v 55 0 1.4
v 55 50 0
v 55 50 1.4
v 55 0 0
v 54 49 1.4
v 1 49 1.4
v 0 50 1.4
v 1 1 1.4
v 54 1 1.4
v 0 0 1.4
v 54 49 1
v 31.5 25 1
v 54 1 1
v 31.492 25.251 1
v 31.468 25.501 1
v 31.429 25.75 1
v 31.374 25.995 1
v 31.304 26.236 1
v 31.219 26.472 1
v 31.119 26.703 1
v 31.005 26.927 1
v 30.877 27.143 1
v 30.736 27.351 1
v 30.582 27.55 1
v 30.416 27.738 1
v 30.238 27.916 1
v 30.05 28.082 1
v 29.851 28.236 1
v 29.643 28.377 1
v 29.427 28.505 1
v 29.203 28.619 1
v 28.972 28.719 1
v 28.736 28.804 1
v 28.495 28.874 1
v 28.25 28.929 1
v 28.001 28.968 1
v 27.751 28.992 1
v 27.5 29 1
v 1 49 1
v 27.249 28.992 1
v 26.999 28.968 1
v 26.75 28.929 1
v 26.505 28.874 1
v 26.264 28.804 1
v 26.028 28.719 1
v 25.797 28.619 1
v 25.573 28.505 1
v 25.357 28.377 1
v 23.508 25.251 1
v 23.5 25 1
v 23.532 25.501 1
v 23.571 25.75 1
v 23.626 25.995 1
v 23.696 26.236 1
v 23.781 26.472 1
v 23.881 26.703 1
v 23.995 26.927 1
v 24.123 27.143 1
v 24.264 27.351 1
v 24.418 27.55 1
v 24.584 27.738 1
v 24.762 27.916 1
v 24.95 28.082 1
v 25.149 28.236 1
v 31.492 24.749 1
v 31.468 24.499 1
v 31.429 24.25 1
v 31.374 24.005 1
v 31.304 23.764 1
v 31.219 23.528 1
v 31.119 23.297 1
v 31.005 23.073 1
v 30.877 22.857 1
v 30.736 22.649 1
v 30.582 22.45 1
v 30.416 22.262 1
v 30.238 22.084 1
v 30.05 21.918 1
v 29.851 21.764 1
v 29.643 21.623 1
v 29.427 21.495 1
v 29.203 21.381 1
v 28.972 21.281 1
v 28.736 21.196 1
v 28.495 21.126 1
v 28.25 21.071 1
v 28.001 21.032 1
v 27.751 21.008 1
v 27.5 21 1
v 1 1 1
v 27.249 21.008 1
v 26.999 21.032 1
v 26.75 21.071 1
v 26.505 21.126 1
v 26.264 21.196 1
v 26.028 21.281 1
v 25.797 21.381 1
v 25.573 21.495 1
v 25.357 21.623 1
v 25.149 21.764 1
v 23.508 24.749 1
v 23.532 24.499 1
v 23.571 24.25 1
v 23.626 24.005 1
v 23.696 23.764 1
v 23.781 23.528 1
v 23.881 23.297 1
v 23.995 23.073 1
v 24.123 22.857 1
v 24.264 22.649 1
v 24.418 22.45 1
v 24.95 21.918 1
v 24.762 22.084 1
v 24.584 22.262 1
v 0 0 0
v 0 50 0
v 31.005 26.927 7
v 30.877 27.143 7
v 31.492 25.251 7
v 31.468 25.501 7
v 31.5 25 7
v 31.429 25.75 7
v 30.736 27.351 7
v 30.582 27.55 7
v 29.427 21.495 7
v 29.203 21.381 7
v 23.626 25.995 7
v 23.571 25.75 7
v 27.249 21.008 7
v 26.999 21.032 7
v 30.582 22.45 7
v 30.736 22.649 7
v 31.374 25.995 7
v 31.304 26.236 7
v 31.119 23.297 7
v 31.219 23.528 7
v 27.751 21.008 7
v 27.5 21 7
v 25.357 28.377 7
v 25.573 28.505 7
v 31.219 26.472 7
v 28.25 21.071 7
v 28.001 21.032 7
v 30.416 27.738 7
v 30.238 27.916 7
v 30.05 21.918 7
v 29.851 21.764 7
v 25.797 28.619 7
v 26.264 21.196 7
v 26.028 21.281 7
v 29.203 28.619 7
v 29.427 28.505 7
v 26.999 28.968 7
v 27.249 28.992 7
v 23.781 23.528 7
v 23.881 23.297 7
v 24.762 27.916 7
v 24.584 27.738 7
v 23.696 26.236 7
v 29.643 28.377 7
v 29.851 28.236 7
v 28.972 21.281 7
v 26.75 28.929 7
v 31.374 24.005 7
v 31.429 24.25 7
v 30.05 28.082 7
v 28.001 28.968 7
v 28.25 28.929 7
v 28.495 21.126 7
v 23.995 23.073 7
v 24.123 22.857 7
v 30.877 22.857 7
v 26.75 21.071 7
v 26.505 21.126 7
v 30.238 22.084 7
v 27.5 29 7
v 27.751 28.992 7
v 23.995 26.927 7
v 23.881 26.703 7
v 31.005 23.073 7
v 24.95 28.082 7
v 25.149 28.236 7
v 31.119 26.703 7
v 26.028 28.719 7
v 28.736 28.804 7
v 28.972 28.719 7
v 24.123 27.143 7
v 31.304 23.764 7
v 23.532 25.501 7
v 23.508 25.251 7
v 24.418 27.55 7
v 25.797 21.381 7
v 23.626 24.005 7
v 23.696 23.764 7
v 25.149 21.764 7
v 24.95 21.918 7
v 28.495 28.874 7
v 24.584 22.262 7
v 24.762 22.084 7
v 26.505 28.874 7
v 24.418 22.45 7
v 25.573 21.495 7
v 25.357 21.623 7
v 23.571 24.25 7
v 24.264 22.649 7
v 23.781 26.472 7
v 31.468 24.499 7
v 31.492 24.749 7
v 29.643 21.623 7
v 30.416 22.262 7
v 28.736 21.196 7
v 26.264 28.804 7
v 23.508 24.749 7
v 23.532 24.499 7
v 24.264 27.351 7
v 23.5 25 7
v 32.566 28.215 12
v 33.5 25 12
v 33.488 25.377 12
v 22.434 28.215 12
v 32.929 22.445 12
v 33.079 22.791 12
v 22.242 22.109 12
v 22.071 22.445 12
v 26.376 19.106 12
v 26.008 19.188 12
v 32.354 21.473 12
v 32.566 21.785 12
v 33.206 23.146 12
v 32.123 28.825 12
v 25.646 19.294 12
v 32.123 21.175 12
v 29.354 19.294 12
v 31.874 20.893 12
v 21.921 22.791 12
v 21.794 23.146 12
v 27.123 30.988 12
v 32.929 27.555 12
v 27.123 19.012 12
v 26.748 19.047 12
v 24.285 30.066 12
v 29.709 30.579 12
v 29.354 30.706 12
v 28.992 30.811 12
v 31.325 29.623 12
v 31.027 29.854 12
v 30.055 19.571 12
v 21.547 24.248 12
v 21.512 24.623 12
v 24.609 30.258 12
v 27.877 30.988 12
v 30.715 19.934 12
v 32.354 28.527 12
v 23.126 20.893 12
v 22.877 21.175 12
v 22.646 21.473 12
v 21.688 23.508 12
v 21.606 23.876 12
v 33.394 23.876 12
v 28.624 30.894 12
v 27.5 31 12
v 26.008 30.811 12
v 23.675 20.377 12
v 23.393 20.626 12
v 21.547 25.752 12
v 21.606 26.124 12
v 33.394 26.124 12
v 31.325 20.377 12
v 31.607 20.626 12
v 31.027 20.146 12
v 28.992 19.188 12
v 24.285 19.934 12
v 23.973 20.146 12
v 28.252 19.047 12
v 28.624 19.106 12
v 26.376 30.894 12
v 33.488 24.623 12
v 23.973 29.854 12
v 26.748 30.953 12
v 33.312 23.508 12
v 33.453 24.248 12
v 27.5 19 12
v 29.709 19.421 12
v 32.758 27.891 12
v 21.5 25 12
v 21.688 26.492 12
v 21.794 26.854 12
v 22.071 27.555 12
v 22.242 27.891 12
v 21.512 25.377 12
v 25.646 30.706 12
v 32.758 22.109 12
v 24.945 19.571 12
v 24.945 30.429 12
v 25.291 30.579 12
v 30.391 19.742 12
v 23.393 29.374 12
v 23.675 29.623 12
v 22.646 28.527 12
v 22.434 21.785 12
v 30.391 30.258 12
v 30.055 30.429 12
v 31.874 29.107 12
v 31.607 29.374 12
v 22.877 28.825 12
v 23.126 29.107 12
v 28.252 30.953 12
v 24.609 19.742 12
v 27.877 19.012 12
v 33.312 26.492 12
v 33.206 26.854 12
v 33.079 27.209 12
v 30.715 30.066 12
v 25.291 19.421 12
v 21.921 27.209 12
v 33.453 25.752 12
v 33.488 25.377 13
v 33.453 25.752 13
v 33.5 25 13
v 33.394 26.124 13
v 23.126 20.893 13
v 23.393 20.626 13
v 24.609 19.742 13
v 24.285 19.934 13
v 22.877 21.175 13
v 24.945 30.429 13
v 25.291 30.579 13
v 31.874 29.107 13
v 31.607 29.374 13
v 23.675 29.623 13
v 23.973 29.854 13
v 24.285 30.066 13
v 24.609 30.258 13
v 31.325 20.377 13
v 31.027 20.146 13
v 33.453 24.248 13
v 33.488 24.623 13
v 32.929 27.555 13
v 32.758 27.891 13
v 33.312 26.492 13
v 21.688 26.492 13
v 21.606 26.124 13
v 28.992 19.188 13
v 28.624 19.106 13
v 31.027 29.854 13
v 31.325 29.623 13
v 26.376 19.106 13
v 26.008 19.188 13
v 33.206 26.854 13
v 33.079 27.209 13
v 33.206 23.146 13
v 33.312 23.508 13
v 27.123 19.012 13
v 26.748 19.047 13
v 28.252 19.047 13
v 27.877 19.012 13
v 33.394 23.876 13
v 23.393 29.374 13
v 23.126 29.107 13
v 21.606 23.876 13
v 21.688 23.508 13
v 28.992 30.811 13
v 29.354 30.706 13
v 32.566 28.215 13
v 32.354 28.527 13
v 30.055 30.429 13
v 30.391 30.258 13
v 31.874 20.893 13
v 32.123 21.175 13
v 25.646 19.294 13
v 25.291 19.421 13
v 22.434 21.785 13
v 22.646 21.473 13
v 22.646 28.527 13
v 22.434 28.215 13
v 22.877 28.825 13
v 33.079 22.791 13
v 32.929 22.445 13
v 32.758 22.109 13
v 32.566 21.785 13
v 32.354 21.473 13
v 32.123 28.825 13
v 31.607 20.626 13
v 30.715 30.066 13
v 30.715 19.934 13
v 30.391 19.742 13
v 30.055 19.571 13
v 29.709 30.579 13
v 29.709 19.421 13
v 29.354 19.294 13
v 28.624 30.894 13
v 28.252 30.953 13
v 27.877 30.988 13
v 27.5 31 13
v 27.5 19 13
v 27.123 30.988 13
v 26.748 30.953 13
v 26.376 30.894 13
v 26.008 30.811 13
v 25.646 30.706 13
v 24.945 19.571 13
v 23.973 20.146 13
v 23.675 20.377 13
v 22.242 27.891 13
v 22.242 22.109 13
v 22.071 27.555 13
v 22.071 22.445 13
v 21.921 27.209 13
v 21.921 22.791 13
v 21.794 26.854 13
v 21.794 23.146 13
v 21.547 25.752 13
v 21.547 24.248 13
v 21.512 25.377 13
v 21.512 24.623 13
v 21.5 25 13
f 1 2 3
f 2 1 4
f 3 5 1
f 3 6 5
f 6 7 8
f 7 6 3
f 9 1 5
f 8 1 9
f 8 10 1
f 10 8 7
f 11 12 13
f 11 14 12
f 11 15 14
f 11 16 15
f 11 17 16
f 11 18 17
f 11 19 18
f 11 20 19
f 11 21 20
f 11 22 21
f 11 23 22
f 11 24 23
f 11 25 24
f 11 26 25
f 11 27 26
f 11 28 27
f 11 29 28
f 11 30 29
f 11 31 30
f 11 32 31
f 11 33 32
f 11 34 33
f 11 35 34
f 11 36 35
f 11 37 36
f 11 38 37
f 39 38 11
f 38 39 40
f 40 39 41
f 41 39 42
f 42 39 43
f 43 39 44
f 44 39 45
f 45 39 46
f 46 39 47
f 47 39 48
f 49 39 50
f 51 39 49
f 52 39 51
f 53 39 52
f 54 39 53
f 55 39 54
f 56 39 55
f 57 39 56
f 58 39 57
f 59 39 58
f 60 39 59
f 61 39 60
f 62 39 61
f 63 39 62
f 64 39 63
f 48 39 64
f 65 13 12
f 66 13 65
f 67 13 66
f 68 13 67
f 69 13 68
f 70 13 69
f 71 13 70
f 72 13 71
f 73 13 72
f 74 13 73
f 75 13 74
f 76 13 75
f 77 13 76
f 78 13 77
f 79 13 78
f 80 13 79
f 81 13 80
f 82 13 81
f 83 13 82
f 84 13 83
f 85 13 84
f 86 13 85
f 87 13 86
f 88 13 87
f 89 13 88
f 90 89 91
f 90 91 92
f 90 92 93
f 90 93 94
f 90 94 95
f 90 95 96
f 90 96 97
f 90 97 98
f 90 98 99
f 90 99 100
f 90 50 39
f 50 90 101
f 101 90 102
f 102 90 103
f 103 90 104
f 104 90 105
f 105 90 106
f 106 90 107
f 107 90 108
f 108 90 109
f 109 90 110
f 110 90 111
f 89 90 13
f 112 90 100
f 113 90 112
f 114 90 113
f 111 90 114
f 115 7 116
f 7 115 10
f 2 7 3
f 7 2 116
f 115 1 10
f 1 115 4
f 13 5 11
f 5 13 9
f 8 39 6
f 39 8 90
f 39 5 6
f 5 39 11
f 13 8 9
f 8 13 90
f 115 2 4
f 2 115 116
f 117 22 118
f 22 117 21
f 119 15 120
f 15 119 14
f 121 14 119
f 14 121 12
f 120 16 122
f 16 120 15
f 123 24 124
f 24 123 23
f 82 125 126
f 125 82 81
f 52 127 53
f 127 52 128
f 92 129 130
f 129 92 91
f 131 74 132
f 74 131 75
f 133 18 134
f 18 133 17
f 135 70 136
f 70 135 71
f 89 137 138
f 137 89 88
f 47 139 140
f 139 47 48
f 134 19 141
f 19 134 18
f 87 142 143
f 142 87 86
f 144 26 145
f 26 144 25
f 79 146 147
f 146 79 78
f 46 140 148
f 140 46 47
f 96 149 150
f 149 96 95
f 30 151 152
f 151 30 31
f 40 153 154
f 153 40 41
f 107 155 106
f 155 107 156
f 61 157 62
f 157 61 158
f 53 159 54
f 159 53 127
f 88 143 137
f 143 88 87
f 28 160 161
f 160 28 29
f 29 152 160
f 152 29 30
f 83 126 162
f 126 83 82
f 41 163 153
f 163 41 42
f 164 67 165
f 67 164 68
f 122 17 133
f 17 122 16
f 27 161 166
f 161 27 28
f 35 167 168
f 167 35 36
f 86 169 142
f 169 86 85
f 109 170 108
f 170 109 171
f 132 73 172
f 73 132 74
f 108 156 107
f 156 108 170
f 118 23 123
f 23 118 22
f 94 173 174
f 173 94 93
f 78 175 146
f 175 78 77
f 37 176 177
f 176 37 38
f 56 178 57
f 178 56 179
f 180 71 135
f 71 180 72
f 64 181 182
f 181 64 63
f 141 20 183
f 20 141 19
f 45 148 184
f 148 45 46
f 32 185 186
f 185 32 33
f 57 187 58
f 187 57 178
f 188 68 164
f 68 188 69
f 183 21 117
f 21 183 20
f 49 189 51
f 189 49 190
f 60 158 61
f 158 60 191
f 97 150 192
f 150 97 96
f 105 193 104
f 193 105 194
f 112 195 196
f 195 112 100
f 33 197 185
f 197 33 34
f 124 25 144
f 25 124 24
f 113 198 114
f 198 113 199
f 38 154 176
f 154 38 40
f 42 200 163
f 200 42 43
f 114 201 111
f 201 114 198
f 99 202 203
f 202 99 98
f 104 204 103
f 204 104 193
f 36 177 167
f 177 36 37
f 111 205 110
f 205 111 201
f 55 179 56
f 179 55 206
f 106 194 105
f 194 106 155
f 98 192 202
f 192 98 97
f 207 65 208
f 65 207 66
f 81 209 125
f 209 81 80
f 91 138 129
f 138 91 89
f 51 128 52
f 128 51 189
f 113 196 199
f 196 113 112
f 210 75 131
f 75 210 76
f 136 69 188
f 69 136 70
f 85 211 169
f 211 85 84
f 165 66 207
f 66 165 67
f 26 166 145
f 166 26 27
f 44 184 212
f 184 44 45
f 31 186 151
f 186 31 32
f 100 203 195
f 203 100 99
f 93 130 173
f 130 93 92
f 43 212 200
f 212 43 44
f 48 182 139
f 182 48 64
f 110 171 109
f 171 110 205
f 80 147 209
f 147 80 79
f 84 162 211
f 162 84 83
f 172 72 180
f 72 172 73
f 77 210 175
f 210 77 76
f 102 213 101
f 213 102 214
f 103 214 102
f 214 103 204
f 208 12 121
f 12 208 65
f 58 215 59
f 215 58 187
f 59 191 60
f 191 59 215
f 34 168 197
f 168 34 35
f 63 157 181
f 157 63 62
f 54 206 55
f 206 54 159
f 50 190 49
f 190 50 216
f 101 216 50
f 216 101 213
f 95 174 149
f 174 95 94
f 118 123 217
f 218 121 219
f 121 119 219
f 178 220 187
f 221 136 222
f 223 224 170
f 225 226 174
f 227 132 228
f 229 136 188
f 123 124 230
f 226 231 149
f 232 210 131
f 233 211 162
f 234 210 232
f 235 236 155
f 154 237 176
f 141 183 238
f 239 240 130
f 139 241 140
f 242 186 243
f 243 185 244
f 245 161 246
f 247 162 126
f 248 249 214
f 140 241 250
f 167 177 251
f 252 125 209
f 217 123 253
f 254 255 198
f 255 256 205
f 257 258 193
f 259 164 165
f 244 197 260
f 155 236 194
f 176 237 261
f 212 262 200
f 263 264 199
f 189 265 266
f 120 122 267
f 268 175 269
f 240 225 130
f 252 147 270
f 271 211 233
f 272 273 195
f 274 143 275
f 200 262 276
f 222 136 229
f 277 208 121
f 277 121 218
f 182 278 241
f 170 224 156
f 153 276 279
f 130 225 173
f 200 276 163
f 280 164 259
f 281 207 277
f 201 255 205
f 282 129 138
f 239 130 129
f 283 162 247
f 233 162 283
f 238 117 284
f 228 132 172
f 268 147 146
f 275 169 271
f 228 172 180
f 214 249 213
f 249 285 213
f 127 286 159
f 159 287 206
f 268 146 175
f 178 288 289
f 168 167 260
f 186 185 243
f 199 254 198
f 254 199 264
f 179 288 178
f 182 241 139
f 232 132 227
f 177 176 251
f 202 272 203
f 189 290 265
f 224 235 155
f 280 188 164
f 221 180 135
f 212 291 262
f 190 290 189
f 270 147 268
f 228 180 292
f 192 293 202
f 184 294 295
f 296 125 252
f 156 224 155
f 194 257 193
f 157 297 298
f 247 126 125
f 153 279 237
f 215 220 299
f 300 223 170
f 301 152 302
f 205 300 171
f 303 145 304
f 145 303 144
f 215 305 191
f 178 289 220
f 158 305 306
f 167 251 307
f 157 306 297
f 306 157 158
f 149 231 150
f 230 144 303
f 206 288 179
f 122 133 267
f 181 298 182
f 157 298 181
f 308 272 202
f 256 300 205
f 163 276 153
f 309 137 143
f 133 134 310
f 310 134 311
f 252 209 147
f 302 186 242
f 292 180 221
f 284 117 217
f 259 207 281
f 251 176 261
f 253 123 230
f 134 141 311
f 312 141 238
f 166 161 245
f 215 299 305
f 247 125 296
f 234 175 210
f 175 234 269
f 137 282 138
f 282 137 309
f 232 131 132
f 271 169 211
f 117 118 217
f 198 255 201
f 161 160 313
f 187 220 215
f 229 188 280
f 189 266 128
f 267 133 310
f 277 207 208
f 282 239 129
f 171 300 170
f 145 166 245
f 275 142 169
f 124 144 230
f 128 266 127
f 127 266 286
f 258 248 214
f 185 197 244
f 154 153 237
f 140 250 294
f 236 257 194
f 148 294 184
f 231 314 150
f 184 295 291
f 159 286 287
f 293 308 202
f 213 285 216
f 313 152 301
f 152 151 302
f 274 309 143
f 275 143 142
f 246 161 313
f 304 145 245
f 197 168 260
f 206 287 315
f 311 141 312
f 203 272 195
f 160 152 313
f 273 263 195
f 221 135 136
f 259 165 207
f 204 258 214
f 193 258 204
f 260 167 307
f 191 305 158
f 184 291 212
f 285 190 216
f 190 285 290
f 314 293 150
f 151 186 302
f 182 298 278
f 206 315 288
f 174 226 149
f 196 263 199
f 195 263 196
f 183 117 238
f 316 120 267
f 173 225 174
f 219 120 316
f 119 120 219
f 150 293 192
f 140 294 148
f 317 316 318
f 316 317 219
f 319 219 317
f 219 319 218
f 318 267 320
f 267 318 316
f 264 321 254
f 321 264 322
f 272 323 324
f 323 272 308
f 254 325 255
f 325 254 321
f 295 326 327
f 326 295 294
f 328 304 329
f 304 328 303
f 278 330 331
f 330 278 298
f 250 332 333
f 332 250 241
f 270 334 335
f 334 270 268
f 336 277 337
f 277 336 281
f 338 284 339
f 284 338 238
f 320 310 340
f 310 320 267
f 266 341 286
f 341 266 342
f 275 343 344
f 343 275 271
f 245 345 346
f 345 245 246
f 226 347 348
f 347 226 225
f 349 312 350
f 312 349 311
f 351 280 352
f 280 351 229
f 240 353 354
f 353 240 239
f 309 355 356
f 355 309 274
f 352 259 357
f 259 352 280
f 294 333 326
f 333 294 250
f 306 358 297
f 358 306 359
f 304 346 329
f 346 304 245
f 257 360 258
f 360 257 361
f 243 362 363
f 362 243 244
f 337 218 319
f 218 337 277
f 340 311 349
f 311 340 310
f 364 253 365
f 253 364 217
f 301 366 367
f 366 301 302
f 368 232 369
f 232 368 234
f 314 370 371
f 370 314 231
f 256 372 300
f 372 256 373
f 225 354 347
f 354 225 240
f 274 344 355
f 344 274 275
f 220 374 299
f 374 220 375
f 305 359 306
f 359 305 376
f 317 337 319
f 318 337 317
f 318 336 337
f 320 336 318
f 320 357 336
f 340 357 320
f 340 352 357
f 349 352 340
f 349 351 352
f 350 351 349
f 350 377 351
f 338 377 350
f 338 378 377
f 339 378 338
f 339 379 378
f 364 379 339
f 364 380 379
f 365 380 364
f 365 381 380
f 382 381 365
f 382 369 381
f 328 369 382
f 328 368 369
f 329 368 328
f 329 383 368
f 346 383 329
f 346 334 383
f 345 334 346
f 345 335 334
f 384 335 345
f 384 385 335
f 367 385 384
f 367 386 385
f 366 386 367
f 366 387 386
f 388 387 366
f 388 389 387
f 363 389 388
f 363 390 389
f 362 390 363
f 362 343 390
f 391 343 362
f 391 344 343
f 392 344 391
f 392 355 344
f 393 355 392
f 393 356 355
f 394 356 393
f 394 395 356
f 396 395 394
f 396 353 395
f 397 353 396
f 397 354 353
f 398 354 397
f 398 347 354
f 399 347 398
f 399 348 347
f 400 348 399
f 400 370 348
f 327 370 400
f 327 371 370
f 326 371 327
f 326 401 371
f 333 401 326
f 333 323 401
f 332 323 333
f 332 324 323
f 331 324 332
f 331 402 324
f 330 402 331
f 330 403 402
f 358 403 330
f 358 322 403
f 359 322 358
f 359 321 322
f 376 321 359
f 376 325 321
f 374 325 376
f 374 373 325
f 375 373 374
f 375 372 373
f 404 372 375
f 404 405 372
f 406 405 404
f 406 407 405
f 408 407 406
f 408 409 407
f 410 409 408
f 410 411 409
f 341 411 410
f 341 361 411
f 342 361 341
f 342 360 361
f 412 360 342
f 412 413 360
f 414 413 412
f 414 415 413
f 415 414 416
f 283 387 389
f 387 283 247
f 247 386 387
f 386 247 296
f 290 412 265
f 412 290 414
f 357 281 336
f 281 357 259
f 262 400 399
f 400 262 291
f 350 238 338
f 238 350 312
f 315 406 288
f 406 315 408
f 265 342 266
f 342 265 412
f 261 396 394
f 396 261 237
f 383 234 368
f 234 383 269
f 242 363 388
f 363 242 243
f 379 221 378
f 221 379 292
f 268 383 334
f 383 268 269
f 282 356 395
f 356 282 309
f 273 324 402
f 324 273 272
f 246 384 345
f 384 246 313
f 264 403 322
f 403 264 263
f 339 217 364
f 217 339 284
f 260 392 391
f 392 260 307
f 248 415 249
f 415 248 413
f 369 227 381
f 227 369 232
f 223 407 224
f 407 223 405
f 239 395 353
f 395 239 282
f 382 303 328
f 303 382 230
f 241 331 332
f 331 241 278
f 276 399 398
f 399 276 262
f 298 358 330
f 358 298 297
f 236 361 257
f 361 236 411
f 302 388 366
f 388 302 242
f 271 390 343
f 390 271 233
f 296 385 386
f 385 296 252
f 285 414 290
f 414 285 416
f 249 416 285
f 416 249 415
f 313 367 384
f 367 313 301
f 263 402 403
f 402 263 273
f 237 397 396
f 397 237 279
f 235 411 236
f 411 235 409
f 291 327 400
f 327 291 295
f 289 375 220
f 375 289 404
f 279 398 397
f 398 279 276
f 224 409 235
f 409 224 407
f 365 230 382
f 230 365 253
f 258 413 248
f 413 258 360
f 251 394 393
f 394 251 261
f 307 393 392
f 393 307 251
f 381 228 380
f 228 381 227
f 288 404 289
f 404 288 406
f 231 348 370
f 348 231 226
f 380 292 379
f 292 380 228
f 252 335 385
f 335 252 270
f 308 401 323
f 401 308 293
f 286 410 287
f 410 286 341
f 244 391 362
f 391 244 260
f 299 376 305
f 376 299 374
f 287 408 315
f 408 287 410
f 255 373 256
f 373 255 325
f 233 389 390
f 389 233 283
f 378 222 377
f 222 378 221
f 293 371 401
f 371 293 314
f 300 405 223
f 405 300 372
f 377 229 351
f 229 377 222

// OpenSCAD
$fn=100;

cube([55, 50, 1]);
translate([0, 0, 1]) difference() {
  cube([55, 50, 0.4]);
  translate([1, 1, 0]) cube([53, 48, 0.4]);
}
translate([27.5, 25, 1]) cylinder(h=6, d=8);
translate([27.5, 25, 7]) cylinder(h=5, d1=8, d2=12);
translate([27.5, 25, 12]) cylinder(h=1, d=12);
